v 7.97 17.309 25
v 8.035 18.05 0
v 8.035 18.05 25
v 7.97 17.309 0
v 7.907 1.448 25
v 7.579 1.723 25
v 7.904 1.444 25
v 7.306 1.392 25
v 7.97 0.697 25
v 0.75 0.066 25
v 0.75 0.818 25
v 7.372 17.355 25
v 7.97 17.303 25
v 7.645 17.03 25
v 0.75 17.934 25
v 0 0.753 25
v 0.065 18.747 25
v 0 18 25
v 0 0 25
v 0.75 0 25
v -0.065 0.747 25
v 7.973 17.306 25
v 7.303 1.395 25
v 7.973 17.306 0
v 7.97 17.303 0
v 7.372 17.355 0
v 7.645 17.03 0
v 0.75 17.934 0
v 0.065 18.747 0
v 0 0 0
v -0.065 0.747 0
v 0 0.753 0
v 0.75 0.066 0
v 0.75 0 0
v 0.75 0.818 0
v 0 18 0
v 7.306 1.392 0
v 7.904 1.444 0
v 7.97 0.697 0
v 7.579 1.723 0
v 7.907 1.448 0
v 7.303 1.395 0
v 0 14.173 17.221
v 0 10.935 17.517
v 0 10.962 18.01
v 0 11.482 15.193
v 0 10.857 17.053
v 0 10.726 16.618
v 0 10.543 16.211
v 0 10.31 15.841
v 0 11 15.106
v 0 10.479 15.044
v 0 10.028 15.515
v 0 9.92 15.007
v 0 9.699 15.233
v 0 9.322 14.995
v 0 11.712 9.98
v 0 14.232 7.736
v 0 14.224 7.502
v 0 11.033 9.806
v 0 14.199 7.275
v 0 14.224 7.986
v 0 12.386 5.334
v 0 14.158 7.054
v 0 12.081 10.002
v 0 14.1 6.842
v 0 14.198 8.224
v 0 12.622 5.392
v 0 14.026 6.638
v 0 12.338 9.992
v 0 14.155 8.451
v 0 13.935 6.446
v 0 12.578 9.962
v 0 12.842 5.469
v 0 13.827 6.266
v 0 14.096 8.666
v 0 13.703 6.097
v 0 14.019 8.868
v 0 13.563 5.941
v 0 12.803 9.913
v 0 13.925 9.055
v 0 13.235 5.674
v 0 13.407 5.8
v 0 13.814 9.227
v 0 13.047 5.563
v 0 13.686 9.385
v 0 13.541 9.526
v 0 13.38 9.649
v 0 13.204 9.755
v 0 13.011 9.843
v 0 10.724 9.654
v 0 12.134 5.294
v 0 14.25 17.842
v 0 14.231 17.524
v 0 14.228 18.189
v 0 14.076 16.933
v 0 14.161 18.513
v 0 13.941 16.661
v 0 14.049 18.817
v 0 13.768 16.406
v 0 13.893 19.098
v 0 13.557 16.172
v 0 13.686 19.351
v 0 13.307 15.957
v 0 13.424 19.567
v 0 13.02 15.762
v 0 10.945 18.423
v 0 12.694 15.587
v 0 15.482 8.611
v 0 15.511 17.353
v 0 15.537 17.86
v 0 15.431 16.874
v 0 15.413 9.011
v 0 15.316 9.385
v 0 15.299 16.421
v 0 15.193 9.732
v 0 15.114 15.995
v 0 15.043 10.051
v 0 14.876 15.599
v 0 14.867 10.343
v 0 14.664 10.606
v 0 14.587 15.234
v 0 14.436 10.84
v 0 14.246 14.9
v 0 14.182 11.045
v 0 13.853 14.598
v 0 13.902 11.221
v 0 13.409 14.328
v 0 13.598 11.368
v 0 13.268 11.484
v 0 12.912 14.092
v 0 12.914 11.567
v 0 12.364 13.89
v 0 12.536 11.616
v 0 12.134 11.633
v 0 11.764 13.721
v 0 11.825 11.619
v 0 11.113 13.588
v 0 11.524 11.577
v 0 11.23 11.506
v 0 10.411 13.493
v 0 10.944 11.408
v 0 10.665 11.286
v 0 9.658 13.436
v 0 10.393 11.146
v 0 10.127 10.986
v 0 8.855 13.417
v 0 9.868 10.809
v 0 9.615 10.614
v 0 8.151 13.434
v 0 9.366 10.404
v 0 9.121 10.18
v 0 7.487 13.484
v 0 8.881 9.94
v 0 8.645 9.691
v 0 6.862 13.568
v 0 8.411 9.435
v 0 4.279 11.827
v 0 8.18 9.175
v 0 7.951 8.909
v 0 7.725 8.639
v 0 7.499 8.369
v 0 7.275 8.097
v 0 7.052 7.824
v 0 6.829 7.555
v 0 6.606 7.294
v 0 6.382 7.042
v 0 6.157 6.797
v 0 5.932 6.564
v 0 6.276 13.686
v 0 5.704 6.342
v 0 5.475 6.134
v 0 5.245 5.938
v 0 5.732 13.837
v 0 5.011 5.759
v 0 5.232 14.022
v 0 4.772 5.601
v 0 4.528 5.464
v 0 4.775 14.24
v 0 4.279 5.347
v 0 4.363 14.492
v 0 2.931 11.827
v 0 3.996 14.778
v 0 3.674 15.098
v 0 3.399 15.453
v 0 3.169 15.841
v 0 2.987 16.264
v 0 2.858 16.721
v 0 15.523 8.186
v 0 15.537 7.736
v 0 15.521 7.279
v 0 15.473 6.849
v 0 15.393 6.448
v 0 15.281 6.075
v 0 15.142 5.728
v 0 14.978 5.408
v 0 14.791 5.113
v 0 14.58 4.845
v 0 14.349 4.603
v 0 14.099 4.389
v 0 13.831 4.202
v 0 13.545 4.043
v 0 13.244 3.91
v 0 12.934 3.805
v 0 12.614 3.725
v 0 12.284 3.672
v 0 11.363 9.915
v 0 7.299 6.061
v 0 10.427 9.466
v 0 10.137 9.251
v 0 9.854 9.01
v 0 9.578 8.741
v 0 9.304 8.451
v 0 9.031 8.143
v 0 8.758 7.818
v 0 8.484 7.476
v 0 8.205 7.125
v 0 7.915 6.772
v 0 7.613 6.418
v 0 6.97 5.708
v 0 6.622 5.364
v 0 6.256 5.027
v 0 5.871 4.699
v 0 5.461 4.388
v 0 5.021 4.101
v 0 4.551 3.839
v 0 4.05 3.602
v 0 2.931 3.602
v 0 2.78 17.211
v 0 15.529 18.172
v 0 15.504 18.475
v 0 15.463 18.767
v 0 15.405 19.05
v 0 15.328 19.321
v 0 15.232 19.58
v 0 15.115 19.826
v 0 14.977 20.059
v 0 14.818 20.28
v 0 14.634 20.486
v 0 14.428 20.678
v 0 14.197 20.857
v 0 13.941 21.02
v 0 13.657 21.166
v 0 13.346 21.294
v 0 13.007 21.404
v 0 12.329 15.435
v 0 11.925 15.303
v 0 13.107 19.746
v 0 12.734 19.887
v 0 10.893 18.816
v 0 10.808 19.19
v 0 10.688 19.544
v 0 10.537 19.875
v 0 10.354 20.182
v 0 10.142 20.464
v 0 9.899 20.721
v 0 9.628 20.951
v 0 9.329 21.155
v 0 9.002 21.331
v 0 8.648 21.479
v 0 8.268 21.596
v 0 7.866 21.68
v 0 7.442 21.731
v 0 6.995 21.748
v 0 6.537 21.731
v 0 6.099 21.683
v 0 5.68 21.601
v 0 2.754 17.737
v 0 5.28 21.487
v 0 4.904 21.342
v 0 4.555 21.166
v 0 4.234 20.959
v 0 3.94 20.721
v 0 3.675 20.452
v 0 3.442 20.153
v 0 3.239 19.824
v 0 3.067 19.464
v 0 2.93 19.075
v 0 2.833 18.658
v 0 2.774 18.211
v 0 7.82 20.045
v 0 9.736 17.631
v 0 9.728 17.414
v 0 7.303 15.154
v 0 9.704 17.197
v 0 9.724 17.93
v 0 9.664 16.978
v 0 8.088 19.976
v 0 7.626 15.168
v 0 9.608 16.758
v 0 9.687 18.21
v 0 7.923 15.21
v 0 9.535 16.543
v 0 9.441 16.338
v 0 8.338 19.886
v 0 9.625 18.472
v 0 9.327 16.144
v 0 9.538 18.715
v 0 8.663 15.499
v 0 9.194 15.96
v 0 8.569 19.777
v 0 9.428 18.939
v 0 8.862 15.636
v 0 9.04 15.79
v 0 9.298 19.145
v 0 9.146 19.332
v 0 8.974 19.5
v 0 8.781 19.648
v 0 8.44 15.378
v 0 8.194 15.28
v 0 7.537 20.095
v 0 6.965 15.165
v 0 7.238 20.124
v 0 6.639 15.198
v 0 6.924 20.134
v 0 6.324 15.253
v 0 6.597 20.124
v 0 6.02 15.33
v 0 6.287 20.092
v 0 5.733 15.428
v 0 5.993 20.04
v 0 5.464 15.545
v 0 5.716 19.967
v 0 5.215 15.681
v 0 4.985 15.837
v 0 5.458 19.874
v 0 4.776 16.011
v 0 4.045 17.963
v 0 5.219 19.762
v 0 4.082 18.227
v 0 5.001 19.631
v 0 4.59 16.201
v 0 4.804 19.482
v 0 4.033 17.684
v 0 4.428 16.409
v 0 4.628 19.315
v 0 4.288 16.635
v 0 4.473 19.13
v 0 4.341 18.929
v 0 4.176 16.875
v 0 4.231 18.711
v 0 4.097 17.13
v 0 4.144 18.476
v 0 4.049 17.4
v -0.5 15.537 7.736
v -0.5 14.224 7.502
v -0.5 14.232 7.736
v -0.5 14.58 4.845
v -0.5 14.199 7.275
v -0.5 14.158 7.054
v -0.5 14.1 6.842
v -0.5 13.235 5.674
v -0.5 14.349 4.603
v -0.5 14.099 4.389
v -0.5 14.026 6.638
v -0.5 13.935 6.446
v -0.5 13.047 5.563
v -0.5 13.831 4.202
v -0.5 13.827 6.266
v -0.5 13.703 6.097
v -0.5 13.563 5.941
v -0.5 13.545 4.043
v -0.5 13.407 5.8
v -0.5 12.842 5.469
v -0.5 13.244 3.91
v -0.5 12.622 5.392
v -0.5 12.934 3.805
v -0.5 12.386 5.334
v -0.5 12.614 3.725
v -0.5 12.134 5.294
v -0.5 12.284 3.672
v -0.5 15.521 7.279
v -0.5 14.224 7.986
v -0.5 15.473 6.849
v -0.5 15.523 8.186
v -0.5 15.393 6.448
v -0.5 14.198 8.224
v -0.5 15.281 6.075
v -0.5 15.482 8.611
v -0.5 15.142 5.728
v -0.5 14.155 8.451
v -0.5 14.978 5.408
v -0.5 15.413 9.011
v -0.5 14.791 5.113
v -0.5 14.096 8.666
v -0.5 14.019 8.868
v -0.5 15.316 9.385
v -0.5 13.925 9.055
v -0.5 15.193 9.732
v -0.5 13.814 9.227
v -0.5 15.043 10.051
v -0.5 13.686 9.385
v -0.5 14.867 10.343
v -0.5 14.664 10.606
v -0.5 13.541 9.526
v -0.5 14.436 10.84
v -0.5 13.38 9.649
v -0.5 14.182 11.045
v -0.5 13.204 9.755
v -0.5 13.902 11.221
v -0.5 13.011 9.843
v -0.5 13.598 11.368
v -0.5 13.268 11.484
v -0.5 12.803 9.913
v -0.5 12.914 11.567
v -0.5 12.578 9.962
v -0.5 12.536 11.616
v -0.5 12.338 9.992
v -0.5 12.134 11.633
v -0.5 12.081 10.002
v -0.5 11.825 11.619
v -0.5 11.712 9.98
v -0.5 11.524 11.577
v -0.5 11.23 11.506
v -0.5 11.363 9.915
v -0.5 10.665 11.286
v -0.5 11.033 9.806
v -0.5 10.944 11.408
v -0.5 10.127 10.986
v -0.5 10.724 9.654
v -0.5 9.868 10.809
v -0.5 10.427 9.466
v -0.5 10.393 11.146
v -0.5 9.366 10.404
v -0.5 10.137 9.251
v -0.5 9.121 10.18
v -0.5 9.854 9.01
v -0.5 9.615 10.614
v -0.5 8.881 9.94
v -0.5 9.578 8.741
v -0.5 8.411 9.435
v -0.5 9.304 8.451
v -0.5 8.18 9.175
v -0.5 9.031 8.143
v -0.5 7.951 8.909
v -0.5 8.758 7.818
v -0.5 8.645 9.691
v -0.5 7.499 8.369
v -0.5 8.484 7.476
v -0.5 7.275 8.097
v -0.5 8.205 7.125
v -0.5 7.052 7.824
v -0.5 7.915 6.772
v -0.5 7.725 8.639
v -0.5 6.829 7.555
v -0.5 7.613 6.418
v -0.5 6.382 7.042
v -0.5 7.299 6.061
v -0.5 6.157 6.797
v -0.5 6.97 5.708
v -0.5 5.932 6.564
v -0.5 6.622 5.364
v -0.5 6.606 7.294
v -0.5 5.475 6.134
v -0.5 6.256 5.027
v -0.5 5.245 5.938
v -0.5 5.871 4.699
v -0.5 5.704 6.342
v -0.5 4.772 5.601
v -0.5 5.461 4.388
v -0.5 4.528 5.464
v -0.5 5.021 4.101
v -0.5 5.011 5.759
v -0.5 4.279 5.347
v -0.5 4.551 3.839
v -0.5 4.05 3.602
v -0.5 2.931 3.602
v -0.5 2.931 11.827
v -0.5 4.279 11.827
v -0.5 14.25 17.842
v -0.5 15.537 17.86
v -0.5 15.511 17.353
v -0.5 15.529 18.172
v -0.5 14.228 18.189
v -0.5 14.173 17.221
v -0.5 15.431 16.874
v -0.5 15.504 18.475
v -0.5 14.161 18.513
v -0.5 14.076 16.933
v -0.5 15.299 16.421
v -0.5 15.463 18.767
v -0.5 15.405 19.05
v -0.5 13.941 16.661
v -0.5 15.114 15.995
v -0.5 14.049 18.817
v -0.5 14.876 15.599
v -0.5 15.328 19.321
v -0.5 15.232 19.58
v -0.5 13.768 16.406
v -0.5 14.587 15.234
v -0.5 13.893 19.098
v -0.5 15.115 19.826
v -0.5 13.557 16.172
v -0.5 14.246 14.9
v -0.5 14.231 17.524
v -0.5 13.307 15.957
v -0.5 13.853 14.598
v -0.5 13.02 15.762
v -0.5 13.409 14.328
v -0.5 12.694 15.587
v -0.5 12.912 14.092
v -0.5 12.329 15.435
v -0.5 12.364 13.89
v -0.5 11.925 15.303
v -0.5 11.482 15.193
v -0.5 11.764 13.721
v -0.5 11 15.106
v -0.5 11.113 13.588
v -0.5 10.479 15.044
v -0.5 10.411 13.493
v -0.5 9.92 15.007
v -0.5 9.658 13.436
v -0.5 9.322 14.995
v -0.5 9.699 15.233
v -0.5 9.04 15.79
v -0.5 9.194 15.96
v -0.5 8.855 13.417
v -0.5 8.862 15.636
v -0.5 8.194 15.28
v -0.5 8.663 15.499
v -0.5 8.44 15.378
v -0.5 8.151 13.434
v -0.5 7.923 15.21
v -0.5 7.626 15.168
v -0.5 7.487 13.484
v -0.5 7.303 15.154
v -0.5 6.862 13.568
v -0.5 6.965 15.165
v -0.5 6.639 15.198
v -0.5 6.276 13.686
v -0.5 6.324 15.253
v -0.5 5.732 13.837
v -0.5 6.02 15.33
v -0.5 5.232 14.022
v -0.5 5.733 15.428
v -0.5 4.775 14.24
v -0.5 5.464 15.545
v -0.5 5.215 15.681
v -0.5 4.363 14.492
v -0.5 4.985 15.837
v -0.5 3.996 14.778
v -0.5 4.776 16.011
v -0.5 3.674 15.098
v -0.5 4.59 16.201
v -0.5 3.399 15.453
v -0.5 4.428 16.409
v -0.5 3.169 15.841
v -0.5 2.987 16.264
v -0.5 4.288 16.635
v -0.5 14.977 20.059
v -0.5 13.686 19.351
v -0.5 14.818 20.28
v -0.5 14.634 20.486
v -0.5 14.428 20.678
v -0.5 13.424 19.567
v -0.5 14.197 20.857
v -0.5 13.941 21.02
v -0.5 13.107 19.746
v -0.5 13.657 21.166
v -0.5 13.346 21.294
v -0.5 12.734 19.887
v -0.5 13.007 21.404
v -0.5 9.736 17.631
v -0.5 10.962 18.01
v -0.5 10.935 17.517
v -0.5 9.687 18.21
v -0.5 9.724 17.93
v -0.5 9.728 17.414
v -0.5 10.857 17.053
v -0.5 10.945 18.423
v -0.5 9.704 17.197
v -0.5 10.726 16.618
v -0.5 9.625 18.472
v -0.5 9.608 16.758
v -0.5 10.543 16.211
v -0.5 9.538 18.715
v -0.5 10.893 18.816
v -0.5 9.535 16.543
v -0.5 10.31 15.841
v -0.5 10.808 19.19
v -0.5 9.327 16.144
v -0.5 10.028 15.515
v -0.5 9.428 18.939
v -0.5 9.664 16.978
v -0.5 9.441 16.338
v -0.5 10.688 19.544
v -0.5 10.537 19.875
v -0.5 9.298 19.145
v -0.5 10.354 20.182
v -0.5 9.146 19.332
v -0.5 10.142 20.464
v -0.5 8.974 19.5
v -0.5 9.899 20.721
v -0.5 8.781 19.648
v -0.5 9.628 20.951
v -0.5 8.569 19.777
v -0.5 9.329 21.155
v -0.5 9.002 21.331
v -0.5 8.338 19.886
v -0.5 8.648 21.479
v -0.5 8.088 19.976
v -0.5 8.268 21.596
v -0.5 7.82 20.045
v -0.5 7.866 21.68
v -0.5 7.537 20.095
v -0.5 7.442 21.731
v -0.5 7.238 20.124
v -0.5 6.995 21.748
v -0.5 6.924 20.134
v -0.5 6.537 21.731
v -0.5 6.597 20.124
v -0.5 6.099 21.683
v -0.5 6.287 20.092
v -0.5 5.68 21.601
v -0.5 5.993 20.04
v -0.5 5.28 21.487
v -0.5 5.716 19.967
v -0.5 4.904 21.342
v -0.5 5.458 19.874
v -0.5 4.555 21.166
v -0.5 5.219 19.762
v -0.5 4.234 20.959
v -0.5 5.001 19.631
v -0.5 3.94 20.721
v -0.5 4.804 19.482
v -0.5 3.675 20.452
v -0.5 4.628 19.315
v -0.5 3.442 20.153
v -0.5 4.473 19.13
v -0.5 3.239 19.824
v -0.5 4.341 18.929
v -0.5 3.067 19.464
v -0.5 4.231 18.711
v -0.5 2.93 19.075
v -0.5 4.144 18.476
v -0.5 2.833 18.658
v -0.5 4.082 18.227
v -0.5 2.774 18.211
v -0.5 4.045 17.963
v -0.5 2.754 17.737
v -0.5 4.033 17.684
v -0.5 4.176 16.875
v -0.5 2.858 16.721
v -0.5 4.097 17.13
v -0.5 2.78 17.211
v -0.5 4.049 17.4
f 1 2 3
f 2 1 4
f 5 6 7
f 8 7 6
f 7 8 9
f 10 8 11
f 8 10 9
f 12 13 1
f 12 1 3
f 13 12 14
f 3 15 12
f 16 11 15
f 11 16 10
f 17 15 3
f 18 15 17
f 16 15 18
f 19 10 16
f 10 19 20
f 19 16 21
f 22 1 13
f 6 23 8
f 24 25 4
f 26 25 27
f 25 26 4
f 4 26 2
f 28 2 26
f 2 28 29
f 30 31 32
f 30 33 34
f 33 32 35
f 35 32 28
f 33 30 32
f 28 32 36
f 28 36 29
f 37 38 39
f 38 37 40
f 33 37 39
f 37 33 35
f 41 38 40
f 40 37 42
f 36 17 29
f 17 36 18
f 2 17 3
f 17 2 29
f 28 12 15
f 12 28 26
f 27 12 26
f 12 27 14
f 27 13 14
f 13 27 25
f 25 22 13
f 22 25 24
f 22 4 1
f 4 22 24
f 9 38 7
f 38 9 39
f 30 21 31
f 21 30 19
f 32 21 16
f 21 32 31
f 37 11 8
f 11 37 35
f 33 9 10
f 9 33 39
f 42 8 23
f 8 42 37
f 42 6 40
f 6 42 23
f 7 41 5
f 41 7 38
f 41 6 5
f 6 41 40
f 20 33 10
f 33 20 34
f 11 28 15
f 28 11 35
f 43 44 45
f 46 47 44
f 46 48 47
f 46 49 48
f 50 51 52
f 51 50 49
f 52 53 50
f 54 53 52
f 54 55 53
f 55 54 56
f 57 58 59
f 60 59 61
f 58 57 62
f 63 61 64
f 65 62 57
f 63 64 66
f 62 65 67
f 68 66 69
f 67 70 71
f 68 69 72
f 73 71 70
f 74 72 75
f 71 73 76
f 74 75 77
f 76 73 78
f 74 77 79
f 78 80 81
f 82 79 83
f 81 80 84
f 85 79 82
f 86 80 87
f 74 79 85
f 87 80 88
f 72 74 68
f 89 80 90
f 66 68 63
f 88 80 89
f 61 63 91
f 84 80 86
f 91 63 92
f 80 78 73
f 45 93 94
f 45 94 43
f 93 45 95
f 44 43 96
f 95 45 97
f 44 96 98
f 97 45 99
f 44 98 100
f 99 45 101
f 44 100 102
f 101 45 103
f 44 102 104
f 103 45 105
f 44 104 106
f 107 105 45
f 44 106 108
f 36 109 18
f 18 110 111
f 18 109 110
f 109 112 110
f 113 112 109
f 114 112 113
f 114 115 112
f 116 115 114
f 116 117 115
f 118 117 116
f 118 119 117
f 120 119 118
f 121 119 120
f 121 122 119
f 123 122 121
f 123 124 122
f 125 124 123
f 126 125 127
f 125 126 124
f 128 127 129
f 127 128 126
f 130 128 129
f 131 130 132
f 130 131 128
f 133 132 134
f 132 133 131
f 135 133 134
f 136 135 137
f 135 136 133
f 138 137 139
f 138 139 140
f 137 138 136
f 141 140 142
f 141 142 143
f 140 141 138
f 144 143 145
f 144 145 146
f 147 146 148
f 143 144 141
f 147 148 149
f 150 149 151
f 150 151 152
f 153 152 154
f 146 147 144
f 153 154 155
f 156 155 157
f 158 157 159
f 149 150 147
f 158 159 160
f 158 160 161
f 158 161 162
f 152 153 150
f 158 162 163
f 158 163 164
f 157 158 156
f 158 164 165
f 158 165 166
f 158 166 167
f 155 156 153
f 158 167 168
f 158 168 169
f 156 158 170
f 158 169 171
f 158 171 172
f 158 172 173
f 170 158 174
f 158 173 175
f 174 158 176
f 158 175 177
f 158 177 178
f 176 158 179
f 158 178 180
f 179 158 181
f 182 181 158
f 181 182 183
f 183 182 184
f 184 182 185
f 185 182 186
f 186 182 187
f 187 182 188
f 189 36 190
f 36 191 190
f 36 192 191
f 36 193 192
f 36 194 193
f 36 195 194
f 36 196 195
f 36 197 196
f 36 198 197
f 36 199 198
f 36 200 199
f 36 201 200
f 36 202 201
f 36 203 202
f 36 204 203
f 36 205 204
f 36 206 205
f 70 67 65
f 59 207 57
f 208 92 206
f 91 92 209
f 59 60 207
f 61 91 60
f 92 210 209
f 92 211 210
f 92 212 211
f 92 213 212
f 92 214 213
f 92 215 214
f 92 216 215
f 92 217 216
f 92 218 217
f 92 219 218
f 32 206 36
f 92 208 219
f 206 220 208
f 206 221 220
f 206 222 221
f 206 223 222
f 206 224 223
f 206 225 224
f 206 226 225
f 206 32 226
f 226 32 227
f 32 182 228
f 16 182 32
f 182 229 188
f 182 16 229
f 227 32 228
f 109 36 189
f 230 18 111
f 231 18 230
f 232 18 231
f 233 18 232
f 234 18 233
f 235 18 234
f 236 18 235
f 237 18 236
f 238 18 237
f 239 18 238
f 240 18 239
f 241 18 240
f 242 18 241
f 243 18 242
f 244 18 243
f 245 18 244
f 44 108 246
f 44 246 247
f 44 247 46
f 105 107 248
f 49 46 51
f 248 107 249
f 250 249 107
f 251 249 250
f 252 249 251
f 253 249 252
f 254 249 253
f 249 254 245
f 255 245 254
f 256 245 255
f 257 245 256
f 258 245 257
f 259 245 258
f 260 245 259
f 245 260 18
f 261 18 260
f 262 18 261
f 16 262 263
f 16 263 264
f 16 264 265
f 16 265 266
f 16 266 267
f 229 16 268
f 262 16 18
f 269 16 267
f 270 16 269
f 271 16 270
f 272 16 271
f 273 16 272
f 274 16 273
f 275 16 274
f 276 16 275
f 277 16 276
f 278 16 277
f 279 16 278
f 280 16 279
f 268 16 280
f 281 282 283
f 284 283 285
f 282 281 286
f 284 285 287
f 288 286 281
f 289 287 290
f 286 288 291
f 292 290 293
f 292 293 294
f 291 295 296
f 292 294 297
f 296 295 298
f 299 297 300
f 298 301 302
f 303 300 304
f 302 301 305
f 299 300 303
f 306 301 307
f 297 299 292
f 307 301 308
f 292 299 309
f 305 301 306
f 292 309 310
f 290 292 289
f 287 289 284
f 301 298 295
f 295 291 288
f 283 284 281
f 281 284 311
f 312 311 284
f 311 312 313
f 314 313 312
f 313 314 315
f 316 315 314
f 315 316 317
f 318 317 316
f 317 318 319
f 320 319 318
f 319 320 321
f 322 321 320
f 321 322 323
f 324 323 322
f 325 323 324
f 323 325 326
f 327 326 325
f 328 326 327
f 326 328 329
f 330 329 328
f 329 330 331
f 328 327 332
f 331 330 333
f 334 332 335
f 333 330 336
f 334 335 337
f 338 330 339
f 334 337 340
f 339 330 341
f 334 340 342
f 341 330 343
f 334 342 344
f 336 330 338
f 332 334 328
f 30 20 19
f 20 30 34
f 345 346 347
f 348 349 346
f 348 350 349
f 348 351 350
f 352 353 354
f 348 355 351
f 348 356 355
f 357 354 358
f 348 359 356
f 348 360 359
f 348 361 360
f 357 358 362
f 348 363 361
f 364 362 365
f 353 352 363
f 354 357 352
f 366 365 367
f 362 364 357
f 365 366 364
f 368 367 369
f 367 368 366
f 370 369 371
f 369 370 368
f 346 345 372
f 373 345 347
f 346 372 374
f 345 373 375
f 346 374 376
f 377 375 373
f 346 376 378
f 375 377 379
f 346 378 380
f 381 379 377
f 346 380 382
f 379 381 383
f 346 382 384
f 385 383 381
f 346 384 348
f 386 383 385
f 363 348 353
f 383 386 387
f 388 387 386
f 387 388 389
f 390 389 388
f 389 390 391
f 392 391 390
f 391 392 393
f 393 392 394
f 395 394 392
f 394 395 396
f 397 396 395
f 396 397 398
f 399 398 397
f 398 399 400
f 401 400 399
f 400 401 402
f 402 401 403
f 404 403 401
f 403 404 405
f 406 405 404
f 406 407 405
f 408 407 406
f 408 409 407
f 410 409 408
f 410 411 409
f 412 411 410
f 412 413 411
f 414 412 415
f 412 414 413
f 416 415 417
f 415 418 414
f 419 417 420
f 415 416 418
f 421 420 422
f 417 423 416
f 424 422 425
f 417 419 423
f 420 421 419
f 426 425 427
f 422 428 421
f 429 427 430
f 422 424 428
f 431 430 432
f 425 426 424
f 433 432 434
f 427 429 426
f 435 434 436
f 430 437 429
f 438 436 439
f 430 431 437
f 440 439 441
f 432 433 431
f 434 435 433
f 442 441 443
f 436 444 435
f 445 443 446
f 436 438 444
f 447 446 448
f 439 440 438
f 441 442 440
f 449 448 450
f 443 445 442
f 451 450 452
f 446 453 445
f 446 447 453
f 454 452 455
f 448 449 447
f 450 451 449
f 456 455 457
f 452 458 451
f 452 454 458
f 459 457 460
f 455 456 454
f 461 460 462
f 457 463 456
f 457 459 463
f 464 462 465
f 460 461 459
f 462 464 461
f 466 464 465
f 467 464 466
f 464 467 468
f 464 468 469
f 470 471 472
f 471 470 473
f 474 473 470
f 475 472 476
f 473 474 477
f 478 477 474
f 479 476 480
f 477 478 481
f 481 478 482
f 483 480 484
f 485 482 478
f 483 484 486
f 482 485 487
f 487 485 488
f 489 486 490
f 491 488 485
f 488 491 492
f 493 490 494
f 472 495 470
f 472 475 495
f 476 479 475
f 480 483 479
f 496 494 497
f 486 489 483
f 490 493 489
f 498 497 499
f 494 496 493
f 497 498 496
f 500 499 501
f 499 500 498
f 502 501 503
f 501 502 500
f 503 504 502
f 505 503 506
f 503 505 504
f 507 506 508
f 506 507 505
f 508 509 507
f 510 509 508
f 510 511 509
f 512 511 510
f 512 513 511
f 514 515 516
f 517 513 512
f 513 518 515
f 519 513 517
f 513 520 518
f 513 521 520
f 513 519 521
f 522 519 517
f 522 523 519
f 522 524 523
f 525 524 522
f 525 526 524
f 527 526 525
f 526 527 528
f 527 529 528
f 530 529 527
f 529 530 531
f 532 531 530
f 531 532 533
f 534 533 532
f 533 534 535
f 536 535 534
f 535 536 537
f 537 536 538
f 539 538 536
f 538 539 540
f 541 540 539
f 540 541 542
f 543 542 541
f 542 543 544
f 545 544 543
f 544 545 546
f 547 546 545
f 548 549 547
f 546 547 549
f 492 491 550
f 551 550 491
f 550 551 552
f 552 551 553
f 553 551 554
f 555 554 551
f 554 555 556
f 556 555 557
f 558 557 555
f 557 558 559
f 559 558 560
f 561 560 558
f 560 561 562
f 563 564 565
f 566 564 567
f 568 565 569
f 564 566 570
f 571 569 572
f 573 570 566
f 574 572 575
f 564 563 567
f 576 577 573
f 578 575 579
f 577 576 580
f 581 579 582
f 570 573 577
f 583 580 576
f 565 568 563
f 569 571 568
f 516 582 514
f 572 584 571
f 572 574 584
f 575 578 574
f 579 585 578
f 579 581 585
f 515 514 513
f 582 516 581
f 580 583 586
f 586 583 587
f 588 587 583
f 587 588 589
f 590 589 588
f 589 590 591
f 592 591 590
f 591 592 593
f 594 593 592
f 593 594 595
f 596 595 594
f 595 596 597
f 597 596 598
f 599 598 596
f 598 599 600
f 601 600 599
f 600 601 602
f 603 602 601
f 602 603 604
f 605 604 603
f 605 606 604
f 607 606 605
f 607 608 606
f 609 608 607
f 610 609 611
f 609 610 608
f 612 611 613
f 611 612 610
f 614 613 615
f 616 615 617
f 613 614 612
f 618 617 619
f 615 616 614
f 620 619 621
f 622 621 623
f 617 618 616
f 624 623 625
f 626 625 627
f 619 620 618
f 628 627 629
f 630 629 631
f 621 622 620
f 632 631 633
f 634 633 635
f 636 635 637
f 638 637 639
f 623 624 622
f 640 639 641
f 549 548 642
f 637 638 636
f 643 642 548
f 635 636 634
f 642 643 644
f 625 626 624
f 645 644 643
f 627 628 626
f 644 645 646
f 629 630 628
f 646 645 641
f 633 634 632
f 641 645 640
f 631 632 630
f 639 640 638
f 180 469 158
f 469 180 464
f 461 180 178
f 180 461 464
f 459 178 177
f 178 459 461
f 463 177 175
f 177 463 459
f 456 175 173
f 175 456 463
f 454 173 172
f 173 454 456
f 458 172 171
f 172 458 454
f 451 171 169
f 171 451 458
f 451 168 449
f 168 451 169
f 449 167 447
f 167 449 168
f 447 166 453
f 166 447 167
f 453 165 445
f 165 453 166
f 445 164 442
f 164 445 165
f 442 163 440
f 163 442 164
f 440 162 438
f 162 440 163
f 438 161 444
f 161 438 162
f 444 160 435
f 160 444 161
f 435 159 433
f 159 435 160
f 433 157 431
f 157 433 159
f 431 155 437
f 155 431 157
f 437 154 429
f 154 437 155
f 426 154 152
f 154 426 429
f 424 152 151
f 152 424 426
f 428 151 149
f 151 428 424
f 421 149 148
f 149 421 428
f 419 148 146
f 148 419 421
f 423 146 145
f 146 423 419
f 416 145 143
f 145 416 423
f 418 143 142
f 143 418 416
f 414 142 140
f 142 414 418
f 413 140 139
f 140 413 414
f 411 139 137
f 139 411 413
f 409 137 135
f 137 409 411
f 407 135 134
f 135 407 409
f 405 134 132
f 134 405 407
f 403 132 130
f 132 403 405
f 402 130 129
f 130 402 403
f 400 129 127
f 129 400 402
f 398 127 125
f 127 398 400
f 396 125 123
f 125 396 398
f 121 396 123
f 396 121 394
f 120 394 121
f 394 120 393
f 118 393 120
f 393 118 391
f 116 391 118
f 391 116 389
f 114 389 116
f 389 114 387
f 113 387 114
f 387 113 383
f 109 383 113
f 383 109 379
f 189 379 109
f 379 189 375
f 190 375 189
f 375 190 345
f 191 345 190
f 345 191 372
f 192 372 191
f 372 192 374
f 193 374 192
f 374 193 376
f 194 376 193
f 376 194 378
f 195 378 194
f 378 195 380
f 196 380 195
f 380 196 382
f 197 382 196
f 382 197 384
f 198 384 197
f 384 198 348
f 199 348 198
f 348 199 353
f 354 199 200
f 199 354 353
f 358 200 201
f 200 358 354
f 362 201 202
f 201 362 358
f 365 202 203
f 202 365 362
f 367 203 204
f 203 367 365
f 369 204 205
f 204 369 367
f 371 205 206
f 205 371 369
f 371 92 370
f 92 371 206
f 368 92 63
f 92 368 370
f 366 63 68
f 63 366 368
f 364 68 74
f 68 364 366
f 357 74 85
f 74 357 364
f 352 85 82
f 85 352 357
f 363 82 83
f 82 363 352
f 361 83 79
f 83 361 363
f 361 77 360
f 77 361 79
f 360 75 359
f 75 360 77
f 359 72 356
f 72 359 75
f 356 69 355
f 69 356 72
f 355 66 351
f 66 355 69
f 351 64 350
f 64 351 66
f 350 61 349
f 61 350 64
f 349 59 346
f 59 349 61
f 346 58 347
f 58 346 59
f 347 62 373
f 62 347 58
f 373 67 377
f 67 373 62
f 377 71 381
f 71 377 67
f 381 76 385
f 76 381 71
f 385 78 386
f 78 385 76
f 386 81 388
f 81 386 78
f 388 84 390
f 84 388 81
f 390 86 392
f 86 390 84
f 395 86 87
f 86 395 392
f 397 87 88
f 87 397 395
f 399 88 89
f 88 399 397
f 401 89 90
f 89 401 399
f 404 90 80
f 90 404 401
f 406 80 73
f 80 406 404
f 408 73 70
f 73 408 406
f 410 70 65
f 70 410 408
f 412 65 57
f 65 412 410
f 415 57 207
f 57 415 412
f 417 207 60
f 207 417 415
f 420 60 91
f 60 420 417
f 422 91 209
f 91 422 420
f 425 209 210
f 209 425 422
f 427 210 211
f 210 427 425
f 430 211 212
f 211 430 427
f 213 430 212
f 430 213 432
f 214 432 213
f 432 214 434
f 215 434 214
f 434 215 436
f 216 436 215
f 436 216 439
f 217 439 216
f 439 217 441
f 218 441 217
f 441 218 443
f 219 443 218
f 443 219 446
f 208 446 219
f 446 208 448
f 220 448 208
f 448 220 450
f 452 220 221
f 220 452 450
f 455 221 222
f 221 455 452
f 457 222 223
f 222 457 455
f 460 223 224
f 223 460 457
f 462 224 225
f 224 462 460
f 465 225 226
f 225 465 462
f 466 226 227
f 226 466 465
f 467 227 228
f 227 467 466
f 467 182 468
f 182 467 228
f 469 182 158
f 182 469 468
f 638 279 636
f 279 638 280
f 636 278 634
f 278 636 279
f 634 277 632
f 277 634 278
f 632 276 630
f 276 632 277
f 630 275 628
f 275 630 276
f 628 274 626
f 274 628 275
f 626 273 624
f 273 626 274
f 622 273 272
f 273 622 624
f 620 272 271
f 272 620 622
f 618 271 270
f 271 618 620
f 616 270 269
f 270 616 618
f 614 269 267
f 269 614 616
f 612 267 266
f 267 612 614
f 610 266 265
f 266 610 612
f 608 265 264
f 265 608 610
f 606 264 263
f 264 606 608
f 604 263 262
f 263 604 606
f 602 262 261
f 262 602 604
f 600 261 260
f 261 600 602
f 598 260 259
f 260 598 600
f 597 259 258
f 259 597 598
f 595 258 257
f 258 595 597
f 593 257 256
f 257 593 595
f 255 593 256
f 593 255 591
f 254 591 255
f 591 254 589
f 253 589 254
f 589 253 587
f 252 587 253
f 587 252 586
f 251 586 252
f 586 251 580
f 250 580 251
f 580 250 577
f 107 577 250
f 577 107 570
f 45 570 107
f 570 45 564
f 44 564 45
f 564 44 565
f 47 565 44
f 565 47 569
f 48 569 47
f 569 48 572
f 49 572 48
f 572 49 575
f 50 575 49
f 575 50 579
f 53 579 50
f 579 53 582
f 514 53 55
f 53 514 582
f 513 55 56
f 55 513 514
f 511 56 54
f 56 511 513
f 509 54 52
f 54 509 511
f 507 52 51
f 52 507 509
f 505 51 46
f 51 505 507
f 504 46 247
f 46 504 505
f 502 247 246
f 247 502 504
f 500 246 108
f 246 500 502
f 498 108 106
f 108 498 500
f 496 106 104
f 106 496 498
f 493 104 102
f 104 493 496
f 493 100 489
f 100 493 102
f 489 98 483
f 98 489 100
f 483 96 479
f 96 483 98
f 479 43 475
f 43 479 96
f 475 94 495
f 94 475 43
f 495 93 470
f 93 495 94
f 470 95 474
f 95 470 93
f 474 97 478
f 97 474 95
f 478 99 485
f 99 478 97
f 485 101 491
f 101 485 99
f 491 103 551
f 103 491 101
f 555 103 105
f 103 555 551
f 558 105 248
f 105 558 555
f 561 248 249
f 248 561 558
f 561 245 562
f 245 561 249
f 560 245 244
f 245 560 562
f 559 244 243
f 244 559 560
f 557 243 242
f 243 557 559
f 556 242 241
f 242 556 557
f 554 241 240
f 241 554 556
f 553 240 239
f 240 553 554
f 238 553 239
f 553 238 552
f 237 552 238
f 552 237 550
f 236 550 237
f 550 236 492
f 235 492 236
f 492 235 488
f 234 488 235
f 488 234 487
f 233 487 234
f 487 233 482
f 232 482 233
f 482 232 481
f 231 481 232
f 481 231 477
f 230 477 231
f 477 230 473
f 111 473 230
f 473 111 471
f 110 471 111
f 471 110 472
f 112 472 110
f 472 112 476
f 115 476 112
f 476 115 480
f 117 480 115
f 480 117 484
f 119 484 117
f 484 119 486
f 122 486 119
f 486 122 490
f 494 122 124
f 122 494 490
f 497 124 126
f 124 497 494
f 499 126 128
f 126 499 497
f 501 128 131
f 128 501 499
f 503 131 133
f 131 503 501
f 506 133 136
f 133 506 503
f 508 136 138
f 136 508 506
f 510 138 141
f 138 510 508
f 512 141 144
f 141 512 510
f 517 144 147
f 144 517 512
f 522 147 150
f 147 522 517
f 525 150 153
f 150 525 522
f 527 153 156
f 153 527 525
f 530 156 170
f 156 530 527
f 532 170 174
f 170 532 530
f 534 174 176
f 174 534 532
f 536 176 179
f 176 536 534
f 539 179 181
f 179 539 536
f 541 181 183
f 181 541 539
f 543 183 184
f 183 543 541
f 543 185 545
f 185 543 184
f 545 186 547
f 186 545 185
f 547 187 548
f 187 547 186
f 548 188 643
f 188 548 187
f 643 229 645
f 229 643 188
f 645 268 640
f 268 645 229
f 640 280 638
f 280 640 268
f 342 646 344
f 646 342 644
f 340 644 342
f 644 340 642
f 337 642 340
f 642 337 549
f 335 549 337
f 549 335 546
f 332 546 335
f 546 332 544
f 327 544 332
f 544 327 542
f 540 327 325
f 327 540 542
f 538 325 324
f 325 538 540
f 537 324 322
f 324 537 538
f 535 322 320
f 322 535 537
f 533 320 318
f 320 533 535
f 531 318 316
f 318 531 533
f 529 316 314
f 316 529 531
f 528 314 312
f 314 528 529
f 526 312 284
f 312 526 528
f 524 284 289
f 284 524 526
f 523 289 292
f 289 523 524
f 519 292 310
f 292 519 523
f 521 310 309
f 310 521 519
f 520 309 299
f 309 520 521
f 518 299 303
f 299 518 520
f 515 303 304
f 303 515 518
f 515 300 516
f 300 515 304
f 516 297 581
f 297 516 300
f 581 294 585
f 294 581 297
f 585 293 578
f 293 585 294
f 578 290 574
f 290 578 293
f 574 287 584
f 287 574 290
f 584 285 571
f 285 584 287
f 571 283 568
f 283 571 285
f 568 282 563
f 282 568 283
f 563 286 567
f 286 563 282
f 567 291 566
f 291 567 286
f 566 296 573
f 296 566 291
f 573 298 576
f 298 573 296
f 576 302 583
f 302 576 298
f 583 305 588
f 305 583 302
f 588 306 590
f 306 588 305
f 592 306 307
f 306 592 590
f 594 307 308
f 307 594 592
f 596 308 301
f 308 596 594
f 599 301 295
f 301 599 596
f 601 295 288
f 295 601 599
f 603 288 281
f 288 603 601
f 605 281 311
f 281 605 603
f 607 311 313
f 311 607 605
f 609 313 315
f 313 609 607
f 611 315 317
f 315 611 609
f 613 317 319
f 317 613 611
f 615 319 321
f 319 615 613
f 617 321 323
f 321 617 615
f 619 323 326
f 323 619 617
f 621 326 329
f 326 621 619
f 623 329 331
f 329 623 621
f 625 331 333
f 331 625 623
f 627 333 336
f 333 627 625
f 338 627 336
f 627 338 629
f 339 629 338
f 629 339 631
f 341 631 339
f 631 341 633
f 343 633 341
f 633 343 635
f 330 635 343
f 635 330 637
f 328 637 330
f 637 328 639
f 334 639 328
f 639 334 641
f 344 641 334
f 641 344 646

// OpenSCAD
// Bookshelf Tag

shelfthick = 18; // thickness of shelf
clipthick = .75; // thickness of clip
cliplen = 8;     // length of legs
clipangle = 5;   // inward angle of legs
clipwid = 25;    // width of clip - make sure that letters fit!
engrave = .5;    // height of letter
nub = .3;        // size of nub on legs


// list of characters to print - wil create rows of 10

s = nub * 2 / 1.4;
xoffset = cliplen + 3;
yoffset = clipwid + 4;

for(i = [0:0]) {
    x = i % 10;
    y = (i-x) / 10;
    translate([x * xoffset, y * yoffset, 0]) {
        cube([clipthick, shelfthick, clipwid]);
        translate([0,shelfthick,0]) rotate([0,0,-clipangle]) {
            cube([cliplen,clipthick,clipwid]);
            translate([cliplen - nub,-nub,0]) rotate([0,0,45]) cube([s, s, clipwid]);
        }
    translate([0,0,0]) rotate([0,0,clipangle]) {
        cube([cliplen,clipthick,clipwid]);
        translate([cliplen - nub,clipthick-nub,0]) rotate([0,0,45]) cube([s, s, clipwid]);
    }
    translate([0,shelfthick/2,clipwid/2]) rotate([0,-90,0]) linear_extrude(height=engrave) text(text=str(26), size=shelfthick-5, valign="center", halign="center");
}
}
